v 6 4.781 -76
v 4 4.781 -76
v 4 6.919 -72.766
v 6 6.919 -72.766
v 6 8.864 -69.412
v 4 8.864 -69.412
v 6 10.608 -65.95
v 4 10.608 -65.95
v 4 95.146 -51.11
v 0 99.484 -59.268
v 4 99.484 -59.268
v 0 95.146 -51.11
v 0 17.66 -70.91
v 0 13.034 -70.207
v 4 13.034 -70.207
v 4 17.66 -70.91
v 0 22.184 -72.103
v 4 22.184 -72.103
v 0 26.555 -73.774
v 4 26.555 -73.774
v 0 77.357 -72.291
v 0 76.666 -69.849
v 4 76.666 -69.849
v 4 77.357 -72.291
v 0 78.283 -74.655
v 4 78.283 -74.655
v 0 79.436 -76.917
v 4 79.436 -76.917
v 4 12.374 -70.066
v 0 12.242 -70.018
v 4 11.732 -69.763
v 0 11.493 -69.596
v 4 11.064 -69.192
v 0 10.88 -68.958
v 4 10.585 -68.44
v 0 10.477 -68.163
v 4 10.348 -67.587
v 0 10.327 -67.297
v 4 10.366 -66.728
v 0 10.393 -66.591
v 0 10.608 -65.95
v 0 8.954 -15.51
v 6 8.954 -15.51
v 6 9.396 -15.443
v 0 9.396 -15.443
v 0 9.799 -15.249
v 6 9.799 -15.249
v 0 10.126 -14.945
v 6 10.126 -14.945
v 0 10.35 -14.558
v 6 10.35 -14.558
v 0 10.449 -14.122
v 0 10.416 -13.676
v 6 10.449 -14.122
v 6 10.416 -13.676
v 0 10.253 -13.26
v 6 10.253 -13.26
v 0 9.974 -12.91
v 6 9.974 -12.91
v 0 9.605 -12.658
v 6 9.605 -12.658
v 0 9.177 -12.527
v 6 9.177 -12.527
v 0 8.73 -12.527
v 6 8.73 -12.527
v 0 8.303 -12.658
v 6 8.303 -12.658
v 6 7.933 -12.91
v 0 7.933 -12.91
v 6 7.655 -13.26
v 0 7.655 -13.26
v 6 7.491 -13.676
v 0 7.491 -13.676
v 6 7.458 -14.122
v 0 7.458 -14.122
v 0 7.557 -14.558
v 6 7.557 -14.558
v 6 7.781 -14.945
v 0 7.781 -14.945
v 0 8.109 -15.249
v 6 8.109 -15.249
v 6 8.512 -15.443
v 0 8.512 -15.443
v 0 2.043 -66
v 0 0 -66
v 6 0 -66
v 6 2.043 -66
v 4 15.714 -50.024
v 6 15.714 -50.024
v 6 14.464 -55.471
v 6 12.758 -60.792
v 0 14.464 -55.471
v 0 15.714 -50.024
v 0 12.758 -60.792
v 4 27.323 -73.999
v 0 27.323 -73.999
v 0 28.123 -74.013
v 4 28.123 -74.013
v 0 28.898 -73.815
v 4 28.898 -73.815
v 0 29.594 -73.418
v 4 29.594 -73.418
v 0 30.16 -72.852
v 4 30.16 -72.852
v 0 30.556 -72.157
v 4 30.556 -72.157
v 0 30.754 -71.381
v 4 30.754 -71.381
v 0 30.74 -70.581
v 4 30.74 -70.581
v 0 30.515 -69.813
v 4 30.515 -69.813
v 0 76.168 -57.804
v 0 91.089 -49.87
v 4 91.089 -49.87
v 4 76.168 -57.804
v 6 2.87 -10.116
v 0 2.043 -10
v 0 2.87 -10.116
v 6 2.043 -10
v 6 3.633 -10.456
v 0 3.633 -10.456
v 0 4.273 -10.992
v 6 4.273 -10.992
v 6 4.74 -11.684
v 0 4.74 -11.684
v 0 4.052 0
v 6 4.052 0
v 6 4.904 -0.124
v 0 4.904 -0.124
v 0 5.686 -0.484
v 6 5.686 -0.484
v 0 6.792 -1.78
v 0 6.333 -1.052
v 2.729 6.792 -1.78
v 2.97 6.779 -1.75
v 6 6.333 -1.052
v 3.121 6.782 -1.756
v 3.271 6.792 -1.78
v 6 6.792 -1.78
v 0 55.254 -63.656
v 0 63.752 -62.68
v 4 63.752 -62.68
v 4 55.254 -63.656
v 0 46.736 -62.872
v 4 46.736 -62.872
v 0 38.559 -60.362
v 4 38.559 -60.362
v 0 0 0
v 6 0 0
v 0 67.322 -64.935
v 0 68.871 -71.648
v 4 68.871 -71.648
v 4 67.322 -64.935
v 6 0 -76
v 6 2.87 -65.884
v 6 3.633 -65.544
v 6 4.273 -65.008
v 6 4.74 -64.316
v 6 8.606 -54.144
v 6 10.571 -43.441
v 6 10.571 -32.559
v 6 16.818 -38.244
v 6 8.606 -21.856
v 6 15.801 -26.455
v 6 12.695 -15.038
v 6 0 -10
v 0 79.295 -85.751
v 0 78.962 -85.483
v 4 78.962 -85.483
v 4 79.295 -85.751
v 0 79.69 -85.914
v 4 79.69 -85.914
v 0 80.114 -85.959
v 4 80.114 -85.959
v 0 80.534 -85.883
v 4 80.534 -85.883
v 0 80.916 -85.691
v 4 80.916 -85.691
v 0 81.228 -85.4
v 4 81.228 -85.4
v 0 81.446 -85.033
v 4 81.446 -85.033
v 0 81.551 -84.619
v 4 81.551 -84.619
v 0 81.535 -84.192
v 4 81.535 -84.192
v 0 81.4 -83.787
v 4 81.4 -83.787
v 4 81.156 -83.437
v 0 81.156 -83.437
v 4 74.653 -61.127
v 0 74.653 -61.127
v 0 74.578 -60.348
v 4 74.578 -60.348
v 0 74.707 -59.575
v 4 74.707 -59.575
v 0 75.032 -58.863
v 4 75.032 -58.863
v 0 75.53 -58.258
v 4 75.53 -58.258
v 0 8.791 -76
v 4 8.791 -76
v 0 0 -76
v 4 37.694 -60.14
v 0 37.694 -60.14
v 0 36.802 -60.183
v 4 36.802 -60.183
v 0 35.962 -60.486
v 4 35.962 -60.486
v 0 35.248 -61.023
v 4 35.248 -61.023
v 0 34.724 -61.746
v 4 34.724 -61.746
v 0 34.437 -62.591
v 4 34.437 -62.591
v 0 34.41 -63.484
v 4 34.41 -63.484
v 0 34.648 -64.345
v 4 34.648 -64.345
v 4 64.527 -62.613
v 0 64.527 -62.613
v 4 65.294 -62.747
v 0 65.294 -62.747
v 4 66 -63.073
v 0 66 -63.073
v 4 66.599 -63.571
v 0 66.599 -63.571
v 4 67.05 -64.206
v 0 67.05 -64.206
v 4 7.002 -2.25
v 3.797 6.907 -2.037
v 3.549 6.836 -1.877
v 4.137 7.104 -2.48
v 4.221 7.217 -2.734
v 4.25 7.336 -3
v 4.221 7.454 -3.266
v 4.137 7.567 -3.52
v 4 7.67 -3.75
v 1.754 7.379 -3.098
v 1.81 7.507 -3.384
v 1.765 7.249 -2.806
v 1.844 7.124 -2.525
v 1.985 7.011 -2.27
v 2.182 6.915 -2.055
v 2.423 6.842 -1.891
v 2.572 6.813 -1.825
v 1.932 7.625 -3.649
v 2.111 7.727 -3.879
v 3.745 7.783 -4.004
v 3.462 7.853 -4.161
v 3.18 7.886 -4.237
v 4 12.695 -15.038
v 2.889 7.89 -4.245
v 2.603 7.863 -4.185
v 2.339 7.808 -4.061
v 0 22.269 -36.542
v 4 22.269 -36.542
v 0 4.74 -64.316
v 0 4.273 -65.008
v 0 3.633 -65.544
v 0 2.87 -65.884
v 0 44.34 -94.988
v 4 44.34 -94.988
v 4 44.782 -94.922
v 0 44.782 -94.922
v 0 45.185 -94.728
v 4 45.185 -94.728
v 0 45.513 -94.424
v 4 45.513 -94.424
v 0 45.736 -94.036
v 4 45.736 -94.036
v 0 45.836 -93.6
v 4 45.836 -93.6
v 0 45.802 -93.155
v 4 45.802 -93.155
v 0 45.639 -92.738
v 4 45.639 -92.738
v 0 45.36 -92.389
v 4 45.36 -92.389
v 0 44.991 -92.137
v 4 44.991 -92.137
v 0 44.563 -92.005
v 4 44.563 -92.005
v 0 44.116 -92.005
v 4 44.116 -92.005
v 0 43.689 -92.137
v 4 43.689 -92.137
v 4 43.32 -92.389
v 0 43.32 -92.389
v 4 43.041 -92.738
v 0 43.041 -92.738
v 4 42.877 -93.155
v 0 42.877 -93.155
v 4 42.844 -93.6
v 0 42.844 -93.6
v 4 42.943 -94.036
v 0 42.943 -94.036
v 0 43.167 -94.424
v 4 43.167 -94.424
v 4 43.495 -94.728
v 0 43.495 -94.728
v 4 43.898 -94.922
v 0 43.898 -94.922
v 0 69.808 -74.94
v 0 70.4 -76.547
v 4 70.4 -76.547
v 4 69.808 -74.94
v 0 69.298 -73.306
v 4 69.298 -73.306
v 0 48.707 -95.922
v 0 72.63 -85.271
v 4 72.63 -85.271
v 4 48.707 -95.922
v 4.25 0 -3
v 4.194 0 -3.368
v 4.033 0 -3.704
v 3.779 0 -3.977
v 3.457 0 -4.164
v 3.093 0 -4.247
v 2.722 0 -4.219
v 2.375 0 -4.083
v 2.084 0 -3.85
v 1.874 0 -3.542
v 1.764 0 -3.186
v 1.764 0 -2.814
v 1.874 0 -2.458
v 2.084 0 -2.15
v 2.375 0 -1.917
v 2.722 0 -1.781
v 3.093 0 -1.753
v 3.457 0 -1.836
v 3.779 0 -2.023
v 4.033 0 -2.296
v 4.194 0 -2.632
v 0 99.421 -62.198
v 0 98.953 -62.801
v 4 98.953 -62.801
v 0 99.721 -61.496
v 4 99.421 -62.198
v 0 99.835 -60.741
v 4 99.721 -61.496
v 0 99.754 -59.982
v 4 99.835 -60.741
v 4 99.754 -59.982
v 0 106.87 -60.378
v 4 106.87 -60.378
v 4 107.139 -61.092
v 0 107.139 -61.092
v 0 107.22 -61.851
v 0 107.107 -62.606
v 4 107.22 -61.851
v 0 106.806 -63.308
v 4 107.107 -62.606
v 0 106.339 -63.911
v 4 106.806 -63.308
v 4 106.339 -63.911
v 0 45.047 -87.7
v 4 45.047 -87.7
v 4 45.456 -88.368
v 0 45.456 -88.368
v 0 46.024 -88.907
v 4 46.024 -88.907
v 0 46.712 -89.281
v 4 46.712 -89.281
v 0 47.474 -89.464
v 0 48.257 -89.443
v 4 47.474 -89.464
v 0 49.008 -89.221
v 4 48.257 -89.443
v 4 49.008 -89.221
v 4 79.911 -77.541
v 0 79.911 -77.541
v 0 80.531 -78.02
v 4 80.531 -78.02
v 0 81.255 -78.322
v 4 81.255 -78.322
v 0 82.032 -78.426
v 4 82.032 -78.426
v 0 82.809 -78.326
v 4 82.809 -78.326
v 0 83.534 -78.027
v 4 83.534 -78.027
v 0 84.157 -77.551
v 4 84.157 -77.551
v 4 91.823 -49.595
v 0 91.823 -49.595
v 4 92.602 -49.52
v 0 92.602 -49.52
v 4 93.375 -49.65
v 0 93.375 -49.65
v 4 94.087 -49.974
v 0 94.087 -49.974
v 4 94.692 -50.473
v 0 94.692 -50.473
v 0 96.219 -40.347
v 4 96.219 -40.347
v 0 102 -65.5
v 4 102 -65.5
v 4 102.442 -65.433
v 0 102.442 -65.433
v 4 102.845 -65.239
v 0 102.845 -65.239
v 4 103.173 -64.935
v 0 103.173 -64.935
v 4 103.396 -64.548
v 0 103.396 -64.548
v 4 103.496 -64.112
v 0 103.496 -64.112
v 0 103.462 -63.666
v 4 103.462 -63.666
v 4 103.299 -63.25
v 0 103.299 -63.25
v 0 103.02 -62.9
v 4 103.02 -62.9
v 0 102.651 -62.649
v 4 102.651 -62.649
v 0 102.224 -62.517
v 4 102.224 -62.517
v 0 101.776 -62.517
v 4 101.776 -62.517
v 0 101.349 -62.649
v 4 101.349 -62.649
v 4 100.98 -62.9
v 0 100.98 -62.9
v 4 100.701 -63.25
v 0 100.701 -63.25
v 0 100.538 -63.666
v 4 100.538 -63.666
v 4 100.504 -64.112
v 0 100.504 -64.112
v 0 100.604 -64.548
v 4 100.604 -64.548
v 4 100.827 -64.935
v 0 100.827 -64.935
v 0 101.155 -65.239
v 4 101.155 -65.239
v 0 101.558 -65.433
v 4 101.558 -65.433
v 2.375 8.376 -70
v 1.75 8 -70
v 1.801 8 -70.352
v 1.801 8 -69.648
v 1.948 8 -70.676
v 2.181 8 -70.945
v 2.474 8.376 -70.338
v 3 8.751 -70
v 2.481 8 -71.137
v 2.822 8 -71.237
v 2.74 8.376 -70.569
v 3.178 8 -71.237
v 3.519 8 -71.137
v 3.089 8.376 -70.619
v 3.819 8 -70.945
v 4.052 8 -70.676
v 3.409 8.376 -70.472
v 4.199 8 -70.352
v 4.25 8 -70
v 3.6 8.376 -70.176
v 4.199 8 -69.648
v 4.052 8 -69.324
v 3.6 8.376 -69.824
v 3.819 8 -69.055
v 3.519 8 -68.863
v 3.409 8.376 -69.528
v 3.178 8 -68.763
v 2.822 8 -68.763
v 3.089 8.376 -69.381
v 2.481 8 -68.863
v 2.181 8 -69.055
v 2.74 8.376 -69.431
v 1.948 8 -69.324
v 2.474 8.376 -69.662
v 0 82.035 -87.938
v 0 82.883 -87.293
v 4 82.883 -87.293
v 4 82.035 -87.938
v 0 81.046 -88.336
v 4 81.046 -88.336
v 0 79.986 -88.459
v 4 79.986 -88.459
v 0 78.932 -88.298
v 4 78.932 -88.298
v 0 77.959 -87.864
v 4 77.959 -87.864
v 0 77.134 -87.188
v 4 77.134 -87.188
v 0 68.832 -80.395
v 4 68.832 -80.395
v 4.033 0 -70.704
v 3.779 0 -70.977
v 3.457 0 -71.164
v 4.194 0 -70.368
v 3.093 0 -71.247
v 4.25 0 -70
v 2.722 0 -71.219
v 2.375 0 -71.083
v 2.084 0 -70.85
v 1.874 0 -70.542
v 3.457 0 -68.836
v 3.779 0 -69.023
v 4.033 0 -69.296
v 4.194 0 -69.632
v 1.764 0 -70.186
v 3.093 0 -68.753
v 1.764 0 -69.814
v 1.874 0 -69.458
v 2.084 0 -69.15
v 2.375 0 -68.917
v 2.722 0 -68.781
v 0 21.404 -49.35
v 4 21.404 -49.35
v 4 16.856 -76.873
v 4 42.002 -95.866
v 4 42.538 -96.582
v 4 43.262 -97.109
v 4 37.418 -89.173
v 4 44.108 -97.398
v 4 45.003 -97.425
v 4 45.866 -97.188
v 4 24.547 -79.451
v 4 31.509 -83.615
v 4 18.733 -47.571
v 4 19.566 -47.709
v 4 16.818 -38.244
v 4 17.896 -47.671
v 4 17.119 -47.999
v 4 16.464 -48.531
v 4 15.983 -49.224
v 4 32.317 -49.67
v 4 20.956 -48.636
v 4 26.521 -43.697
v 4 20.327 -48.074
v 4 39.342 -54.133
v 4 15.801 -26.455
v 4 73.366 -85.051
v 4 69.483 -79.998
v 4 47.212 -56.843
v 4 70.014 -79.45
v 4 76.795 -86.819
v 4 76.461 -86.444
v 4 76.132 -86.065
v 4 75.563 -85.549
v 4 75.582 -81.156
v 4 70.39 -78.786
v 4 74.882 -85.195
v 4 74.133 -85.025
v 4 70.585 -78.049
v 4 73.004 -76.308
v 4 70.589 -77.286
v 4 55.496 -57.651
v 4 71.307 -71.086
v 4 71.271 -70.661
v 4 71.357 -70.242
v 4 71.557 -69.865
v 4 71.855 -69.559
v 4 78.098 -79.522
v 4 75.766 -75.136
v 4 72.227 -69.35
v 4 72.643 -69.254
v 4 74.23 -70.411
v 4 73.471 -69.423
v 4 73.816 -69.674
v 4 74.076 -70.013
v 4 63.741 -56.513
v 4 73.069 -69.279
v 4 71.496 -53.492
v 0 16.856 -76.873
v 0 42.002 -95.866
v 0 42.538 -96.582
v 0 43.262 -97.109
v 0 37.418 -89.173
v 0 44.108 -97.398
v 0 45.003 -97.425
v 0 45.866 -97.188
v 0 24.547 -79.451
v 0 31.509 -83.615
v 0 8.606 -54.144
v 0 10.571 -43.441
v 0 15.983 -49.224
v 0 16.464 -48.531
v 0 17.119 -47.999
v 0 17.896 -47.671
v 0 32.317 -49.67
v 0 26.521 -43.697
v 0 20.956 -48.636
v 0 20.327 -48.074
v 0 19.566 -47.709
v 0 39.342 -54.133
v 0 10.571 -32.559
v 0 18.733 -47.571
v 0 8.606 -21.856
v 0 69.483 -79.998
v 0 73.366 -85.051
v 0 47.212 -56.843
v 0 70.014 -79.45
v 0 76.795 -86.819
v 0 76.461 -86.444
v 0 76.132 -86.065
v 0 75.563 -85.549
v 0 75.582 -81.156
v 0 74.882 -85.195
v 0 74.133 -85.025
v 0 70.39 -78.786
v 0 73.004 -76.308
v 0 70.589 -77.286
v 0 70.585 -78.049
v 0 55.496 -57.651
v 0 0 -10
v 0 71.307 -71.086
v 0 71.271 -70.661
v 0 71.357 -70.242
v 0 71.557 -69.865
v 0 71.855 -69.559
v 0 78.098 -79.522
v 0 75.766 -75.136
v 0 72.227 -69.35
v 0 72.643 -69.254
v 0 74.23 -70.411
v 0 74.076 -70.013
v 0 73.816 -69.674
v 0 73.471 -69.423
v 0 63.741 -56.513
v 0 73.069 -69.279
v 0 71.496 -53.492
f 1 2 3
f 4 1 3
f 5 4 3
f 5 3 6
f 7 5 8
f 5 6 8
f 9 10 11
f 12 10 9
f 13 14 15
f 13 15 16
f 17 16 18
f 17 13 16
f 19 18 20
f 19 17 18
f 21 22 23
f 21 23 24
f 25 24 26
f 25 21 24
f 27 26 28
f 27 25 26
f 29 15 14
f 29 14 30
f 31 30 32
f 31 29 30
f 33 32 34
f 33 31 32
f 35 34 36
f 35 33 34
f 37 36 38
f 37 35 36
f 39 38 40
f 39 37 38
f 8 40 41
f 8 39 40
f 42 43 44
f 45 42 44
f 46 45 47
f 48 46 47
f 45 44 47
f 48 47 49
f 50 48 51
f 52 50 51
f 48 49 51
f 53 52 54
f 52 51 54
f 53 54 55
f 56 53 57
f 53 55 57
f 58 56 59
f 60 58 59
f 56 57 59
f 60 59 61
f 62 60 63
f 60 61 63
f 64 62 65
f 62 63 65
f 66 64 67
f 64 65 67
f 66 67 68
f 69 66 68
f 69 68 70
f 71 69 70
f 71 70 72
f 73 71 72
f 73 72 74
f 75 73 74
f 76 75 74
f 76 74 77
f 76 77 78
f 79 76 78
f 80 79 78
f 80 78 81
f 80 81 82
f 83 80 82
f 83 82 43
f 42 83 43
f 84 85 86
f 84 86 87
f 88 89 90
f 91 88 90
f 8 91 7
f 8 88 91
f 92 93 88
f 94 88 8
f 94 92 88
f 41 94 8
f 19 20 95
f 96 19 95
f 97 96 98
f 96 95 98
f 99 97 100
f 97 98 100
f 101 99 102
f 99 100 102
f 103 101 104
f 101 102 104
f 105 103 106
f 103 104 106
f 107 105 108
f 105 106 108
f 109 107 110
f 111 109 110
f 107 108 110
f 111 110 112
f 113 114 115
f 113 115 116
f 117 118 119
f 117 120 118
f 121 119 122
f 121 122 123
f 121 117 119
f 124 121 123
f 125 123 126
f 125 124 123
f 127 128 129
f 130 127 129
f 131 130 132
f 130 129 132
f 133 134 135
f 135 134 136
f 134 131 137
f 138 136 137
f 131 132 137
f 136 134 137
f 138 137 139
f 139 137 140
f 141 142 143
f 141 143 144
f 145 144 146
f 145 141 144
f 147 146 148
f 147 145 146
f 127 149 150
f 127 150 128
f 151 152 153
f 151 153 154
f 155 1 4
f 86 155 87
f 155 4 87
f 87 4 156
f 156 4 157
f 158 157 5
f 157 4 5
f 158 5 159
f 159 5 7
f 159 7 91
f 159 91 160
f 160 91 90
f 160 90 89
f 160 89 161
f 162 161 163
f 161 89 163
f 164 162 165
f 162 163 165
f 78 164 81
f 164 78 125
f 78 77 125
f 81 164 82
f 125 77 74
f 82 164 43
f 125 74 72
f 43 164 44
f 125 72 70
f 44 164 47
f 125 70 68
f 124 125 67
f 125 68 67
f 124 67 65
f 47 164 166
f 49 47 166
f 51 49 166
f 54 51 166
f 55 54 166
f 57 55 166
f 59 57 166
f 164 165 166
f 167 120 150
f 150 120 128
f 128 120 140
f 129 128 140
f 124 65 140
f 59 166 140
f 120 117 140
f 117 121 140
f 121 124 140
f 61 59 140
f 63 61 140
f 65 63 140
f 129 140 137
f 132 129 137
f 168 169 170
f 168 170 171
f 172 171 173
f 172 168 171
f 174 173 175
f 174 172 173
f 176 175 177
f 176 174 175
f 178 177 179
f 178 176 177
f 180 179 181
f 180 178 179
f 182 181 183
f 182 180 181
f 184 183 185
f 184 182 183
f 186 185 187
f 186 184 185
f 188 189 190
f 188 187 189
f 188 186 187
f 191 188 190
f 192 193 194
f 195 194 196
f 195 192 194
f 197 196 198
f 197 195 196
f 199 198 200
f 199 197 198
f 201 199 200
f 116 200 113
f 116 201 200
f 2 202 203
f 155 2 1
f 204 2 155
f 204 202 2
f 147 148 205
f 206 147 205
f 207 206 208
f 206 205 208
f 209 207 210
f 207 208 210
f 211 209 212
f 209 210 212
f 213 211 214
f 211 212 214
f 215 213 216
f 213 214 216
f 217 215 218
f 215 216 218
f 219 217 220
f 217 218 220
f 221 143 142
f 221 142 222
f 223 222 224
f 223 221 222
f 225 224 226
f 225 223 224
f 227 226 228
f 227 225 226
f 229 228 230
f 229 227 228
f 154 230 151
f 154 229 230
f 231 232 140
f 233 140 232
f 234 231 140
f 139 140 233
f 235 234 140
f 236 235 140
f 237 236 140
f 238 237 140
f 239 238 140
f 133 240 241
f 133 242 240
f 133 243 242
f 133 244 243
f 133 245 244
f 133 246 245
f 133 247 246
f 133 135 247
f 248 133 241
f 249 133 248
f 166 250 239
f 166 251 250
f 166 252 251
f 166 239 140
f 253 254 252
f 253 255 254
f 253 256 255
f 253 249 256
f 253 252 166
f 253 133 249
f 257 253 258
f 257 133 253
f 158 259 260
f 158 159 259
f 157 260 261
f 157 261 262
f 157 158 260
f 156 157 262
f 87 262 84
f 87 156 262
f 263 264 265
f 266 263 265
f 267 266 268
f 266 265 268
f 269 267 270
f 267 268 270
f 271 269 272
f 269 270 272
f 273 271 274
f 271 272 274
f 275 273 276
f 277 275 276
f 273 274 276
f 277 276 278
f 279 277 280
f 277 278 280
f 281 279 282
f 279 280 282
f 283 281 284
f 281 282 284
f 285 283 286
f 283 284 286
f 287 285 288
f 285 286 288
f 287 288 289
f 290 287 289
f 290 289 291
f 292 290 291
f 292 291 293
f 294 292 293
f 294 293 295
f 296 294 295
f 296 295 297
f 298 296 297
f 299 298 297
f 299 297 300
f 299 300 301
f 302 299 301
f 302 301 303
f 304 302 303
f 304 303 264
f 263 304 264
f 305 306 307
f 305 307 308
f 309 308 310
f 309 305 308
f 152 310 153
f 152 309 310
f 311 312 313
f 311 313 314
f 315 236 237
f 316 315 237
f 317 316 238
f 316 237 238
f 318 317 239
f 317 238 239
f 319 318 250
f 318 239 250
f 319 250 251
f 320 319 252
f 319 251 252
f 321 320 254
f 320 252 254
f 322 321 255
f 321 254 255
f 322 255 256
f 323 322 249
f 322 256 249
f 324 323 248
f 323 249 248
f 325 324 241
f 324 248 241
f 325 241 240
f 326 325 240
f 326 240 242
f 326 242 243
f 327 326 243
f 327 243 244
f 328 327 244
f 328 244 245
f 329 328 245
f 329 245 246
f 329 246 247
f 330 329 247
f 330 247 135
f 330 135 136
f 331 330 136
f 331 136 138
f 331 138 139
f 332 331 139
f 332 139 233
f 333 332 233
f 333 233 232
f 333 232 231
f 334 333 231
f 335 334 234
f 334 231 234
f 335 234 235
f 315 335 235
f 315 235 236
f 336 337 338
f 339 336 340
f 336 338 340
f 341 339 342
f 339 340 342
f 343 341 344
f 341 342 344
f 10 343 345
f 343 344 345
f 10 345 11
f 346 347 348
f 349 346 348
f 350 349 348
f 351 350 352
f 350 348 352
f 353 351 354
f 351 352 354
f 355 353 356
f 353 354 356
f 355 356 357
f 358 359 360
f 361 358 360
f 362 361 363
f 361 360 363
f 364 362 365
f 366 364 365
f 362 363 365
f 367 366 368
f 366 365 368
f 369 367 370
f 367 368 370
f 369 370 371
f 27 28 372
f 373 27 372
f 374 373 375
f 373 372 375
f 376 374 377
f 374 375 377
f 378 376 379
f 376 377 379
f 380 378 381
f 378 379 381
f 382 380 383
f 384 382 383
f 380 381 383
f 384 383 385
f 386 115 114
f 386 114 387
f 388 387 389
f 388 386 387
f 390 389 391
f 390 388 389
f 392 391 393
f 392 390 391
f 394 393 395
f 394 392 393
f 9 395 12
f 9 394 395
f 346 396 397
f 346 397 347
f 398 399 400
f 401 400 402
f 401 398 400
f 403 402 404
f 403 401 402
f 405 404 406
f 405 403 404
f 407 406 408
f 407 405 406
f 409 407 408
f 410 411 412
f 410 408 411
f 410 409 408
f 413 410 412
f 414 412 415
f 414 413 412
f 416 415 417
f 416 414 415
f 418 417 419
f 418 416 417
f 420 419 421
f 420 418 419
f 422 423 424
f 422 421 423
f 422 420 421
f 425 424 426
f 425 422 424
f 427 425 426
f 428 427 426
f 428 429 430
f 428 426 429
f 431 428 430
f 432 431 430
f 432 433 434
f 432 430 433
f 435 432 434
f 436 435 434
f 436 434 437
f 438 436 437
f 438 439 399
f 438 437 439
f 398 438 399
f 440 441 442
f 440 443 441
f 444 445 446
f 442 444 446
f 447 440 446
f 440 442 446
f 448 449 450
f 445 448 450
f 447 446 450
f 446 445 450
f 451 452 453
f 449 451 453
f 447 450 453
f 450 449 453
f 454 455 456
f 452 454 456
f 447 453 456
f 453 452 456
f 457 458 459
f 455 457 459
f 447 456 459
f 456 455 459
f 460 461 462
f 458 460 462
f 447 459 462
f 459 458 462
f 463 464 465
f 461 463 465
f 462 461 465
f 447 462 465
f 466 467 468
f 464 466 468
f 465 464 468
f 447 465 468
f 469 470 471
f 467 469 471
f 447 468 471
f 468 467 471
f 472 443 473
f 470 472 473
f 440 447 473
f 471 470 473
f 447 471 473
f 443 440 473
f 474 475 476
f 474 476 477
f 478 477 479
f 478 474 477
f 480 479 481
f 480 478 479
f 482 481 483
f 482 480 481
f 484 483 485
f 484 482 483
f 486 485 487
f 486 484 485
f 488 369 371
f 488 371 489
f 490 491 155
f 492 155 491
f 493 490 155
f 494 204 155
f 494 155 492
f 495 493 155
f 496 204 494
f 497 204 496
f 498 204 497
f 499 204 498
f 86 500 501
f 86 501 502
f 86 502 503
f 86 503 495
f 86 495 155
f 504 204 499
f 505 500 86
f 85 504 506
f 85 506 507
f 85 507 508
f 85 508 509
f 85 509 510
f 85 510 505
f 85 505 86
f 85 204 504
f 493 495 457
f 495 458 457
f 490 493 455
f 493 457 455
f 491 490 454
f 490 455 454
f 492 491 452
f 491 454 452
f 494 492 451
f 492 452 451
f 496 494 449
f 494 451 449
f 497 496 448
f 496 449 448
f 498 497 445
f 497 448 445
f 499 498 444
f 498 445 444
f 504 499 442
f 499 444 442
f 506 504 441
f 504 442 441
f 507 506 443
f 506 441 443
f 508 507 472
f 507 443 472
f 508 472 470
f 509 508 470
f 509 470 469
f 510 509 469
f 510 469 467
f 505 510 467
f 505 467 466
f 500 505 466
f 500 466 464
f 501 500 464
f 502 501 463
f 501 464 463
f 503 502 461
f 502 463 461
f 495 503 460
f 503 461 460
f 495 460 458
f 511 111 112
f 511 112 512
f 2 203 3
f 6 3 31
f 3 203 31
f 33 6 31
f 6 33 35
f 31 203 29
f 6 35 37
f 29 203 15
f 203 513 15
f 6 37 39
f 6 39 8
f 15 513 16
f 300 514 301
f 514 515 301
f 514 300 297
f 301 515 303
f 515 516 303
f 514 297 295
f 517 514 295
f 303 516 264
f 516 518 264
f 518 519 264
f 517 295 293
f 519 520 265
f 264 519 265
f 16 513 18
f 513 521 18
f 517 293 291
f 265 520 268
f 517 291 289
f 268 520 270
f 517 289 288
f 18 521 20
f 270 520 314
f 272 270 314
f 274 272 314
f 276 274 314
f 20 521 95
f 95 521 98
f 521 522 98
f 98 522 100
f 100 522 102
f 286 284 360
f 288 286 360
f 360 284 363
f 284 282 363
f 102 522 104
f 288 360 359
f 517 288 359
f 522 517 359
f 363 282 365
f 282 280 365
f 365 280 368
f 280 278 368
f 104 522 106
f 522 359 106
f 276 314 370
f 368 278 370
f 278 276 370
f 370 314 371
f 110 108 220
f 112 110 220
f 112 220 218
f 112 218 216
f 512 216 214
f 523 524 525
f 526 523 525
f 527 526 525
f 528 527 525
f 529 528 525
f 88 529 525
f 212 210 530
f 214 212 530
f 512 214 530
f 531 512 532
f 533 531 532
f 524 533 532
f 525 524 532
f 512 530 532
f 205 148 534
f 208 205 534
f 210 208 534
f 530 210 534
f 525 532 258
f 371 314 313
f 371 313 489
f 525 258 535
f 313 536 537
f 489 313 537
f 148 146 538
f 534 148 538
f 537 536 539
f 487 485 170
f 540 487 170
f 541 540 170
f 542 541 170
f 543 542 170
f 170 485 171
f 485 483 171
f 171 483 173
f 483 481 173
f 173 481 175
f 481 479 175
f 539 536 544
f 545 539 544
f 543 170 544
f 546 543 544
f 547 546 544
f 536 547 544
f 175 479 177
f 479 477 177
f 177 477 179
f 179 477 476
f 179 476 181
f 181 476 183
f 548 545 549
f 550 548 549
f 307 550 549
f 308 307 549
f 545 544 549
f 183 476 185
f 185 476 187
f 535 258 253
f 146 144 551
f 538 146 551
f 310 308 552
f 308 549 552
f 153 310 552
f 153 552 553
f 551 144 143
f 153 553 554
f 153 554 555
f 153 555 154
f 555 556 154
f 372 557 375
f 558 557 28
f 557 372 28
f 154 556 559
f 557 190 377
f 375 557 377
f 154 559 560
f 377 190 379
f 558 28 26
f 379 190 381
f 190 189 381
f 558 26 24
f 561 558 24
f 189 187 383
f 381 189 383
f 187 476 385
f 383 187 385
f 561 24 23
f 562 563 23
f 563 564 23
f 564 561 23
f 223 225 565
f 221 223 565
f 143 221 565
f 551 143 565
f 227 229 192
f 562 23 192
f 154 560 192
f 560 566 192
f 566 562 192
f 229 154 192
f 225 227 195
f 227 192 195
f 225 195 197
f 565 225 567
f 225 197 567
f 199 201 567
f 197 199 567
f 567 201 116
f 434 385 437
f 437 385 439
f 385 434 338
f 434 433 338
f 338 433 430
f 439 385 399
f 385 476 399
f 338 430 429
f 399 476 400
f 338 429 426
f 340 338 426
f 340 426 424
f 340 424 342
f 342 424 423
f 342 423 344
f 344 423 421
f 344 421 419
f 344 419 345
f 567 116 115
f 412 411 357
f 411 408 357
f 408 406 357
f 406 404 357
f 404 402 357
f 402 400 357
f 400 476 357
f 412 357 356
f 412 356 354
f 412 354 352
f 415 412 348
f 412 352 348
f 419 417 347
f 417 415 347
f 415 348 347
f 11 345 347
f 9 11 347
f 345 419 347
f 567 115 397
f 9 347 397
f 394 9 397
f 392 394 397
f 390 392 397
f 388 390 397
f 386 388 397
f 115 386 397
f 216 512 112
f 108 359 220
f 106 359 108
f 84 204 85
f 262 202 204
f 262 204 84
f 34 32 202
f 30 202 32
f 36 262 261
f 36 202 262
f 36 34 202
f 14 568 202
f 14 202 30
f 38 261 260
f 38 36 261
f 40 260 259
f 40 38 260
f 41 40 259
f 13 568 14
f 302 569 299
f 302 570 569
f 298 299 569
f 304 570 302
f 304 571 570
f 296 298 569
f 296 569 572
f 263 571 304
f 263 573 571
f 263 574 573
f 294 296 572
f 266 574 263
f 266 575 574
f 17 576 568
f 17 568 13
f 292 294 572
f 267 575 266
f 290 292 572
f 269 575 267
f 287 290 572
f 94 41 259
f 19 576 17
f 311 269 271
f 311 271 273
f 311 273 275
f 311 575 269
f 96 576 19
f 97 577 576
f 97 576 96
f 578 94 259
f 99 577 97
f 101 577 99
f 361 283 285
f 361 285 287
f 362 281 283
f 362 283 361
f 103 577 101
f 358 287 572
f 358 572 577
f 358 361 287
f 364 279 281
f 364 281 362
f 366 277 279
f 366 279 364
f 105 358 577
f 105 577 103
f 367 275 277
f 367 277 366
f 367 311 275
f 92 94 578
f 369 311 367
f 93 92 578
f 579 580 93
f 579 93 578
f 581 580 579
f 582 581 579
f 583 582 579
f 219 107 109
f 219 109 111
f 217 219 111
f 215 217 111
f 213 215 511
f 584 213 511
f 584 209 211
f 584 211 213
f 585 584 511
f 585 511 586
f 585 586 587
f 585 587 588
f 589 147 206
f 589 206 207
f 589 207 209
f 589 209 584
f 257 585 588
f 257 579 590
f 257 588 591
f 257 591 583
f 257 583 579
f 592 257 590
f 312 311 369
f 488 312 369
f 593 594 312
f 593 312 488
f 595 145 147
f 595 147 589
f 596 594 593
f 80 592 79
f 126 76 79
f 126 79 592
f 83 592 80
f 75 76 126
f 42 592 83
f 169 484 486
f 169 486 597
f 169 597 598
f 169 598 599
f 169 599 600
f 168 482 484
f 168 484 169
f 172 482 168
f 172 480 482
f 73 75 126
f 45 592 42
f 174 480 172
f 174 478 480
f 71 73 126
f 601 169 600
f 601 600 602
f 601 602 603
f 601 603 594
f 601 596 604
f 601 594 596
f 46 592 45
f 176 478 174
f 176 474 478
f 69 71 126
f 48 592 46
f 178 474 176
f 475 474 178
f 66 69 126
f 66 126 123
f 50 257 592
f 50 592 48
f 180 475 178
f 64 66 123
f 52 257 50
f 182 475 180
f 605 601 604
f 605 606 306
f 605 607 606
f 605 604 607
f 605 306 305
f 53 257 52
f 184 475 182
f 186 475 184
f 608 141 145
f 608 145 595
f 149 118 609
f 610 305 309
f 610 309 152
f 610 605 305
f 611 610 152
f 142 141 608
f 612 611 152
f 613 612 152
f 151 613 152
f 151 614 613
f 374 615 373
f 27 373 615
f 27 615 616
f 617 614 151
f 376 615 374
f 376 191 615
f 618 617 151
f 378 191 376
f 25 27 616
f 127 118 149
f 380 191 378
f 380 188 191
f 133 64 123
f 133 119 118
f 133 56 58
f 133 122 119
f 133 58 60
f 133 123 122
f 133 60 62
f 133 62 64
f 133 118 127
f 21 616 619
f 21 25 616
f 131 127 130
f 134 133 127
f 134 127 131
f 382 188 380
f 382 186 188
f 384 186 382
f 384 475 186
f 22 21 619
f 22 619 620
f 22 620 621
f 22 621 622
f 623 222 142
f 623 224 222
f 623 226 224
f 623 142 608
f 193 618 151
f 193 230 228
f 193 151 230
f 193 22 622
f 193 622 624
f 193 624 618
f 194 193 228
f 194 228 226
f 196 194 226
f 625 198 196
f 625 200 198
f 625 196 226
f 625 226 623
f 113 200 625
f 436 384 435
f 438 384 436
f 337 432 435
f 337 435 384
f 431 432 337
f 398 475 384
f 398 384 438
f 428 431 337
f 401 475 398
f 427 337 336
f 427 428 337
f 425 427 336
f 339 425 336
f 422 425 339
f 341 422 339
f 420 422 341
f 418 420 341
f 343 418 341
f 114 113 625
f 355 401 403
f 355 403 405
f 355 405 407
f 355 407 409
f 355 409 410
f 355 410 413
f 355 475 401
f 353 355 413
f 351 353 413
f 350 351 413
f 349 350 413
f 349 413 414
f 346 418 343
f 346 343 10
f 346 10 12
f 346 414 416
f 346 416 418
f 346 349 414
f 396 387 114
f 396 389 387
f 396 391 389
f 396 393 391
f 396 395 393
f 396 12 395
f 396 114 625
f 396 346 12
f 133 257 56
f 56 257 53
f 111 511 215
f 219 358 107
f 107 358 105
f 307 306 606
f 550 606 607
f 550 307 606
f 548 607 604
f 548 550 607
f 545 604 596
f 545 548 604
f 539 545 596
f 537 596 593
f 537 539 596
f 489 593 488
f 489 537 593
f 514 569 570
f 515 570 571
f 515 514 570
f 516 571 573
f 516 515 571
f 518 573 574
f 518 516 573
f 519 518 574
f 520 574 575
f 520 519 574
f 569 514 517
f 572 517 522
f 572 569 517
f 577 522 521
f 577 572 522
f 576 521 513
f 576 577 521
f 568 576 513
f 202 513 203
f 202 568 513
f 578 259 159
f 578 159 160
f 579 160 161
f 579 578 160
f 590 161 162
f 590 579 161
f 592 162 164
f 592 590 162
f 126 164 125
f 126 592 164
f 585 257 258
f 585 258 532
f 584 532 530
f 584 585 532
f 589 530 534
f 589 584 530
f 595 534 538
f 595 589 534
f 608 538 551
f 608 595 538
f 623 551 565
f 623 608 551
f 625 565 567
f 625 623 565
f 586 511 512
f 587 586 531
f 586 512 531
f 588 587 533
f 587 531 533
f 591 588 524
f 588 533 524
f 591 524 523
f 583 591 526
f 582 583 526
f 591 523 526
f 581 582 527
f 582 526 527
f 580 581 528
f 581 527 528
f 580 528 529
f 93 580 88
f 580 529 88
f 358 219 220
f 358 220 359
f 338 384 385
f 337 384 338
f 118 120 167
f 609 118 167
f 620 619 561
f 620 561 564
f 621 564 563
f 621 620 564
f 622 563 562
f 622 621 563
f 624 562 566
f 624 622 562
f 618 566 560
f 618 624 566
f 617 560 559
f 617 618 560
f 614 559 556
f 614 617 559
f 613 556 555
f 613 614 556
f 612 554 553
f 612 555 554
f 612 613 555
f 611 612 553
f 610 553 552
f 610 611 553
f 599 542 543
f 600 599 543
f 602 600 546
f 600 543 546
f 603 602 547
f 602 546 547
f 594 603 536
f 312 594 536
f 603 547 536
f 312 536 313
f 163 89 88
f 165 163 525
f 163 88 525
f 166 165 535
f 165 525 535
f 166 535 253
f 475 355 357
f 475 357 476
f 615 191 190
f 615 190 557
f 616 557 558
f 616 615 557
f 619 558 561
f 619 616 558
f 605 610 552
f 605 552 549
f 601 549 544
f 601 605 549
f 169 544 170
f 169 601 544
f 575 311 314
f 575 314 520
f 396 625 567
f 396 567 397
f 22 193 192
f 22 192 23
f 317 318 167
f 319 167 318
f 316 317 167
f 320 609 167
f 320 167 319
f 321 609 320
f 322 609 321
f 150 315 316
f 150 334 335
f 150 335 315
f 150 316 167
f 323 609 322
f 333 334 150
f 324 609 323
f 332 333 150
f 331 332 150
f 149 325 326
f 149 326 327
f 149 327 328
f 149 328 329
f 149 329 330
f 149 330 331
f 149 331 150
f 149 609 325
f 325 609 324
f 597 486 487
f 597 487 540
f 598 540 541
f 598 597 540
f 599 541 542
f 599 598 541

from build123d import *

# Parameters (mm, degrees)
SKETCH1_R                   = 1.5
BOSS_EXTRUDE1_DEPTH         = 6
FILLET1_R                   = 3
TAP_DRILL_FOR_M3_TAP1_D     = 2.5
TAP_DRILL_FOR_M3_TAP1_DEPTH = 8
TAP_DRILL_FOR_M3_TAP1_TIP   = 0.751075774
CUT_EXTRUDE1_START          = -2
CUT_EXTRUDE1_DEPTH          = 2
CUT_EXTRUDE2_REACH          = 147.011
SKETCH7_R                   = 1.5


with BuildPart() as part:
    # Sketch1 → Boss-Extrude1 (new body)
    with BuildSketch(Plane(origin=(0, 0, 0), x_dir=(0, 0, -1), z_dir=(1, 0, 0))):
        with BuildLine():
            Line((0, 0), (0, 6))
            Line((0, 6), (36.541818306, 22.269465723))
            ThreePointArc((36.541818306, 22.269465723), (55.71908903, 43.197784292), (53.491952961, 71.496231166))
            Line((53.491952961, 71.496231166), (40.346749203, 96.218763766))
            Line((40.346749203, 96.218763766), (62.341129166, 107.913383036))
            Line((62.341129166, 107.913383036), (87.292806812, 82.883380245))
            ThreePointArc((87.292806812, 82.883380245), (88.459285656, 79.986445673), (87.187944242, 77.133974145))
            ThreePointArc((87.187944242, 77.133974145), (85.791082043, 75.901173525), (84.328789644, 74.746737597))
            Line((84.328789644, 74.746737597), (95.922273052, 48.707347523))
            Line((95.922273052, 48.707347523), (98.362692911, 43.226074777))
            ThreePointArc((98.362692911, 43.226074777), (82.081212508, 29.320376834), (76, 8.790547467))
            Line((76, 8.790547467), (76, 0))
            Line((76, 0), (66, 0))
            Line((66, 0), (66, 3.884469182))
            ThreePointArc((66, 3.884469182), (38, 10.818472536), (10, 3.884469182))
            Line((10, 3.884469182), (10, 0))
            Line((10, 0), (0, 0))
        make_face()
        with Locations((64, 102)):
            Circle(SKETCH1_R, mode=Mode.SUBTRACT)
        with BuildLine():
            Line((78.174939554, 34.237907891), (39.032120003, 16.810401803))
            ThreePointArc((39.032120003, 16.810401803), (55.025629399, 14.584670036), (70, 8.541951295))
            Line((70, 8.541951295), (70, 8.790547467))
            ThreePointArc((70, 8.790547467), (72.093906618, 22.154657887), (78.174939554, 34.237907891))
        make_face(mode=Mode.SUBTRACT)
        with BuildLine():
            Line((56.201627065, 31.02257653), (90.441000307, 46.266927665))
            Line((90.441000307, 46.266927665), (79.173694043, 71.573711875))
            ThreePointArc((79.173694043, 71.573711875), (75.490729324, 70.000575949), (71.648335848, 68.871417797))
            Line((71.648335848, 68.871417797), (61.936537439, 66.629272466))
            ThreePointArc((61.936537439, 66.629272466), (63.129066114, 48.17201256), (56.201627065, 31.02257653))
        make_face(mode=Mode.SUBTRACT)
        with BuildLine():
            Line((80.108700039, 81.591428686), (61.231449963, 100.527935833))
            Line((61.231449963, 100.527935833), (48.461264136, 93.737907585))
            Line((48.461264136, 93.737907585), (58.884294031, 74.135039414))
            Line((58.884294031, 74.135039414), (69.848727413, 76.666378316))
            ThreePointArc((69.848727413, 76.666378316), (75.251497028, 78.560635362), (80.108700039, 81.591428686))
        make_face(mode=Mode.SUBTRACT)
        with BuildLine():
            ThreePointArc((71.085958212, 71.307342959), (78.788354228, 74.187150825), (85.482948342, 78.962358399))
            ThreePointArc((85.482948342, 78.962358399), (85.556981354, 81.082386492), (83.436953262, 81.156419504))
            ThreePointArc((83.436953262, 81.156419504), (77.379939539, 76.835993604), (70.411105049, 74.230453154))
            ThreePointArc((70.411105049, 74.230453154), (69.286976533, 72.431471475), (71.085958212, 71.307342959))
        make_face(mode=Mode.SUBTRACT)
    extrude(amount=BOSS_EXTRUDE1_DEPTH)

    # Fillet1
    fillet1_edges = [part.edges().sort_by_distance(p)[0] for p in [
        (3, 3.884469182, -66),
        (3, 3.884469182, -10),
        (3, 43.226074777, -98.362692911),
        (3, 16.810401803, -39.032120003),
        (3, 34.237907891, -78.174939554),
        (3, 8.541951295, -70),
        (3, 46.266927665, -90.441000307),
        (3, 31.02257653, -56.201627065),
        (3, 81.591428686, -80.108700039),
        (3, 107.913383036, -62.341129166),
        (3, 100.527935833, -61.231449963),
        (3, 93.737907585, -48.461264136),
        (3, 74.135039414, -58.884294031),
        (3, 6, 0),
        (3, 66.629272466, -61.936537439),
        (3, 74.746737597, -84.328789644),
        (3, 71.573711875, -79.173694043),
    ]]
    fillet(fillet1_edges, radius=FILLET1_R)

    # Tap Drill for M3 Tap1
    with Locations(Plane(origin=(0, 0, 0), x_dir=(-1, 0, 0), z_dir=(0, -1, 0))):
        with Locations((-3, 3), (-3, 70)):
            Hole(TAP_DRILL_FOR_M3_TAP1_D / 2, depth=TAP_DRILL_FOR_M3_TAP1_DEPTH)
            with Locations((0, 0, -(TAP_DRILL_FOR_M3_TAP1_DEPTH + TAP_DRILL_FOR_M3_TAP1_TIP / 2))):  # 118° drill point
                Cone(0, TAP_DRILL_FOR_M3_TAP1_D / 2, TAP_DRILL_FOR_M3_TAP1_TIP, mode=Mode.SUBTRACT)

    # Sketch6 → Cut-Extrude1 (cut)
    with BuildSketch(Plane(origin=(6, 0, 0), x_dir=(0, 0, -1), z_dir=(1, 0, 0)).offset(CUT_EXTRUDE1_START)):
        with BuildLine():
            Line((0, 6), (0, 120))
            Line((0, 120), (100, 120))
            Line((100, 120), (100, 4.781422789))
            Line((100, 4.781422789), (76, 4.781422789))
            ThreePointArc((76, 4.781422789), (42.323682099, 16.676697331), (7.381236086, 9.286338039))
            Line((7.381236086, 9.286338039), (0, 6))
        make_face()
    extrude(amount=CUT_EXTRUDE1_DEPTH, mode=Mode.SUBTRACT)

    # Sketch7 → Cut-Extrude2 (cut, up to next)
    with BuildSketch(Plane(origin=(6, 0, 0), x_dir=(0, 0, -1), z_dir=(1, 0, 0)), mode=Mode.PRIVATE) as cut_extrude2_sk1:
        with Locations((14.009846336, 8.95367663)):
            Circle(SKETCH7_R)
    cut_extrude2_tool1 = extrude(cut_extrude2_sk1.sketch, amount=-CUT_EXTRUDE2_REACH, mode=Mode.PRIVATE) & part.part
    # Sketch7 → Cut-Extrude2 (cut, up to next)
    with BuildSketch(Plane(origin=(6, 0, 0), x_dir=(0, 0, -1), z_dir=(1, 0, 0)), mode=Mode.PRIVATE) as cut_extrude2_sk2:
        with Locations((93.488301151, 44.339764578)):
            Circle(SKETCH7_R)
    cut_extrude2_tool2 = extrude(cut_extrude2_sk2.sketch, amount=-CUT_EXTRUDE2_REACH, mode=Mode.PRIVATE) & part.part
    add(cut_extrude2_tool1.solids().sort_by_distance((6, 8.953677, -14.009846))[0], mode=Mode.SUBTRACT)
    add(cut_extrude2_tool2.solids().sort_by_distance((6, 44.339765, -93.488301))[0], mode=Mode.SUBTRACT)


solid = part.part
